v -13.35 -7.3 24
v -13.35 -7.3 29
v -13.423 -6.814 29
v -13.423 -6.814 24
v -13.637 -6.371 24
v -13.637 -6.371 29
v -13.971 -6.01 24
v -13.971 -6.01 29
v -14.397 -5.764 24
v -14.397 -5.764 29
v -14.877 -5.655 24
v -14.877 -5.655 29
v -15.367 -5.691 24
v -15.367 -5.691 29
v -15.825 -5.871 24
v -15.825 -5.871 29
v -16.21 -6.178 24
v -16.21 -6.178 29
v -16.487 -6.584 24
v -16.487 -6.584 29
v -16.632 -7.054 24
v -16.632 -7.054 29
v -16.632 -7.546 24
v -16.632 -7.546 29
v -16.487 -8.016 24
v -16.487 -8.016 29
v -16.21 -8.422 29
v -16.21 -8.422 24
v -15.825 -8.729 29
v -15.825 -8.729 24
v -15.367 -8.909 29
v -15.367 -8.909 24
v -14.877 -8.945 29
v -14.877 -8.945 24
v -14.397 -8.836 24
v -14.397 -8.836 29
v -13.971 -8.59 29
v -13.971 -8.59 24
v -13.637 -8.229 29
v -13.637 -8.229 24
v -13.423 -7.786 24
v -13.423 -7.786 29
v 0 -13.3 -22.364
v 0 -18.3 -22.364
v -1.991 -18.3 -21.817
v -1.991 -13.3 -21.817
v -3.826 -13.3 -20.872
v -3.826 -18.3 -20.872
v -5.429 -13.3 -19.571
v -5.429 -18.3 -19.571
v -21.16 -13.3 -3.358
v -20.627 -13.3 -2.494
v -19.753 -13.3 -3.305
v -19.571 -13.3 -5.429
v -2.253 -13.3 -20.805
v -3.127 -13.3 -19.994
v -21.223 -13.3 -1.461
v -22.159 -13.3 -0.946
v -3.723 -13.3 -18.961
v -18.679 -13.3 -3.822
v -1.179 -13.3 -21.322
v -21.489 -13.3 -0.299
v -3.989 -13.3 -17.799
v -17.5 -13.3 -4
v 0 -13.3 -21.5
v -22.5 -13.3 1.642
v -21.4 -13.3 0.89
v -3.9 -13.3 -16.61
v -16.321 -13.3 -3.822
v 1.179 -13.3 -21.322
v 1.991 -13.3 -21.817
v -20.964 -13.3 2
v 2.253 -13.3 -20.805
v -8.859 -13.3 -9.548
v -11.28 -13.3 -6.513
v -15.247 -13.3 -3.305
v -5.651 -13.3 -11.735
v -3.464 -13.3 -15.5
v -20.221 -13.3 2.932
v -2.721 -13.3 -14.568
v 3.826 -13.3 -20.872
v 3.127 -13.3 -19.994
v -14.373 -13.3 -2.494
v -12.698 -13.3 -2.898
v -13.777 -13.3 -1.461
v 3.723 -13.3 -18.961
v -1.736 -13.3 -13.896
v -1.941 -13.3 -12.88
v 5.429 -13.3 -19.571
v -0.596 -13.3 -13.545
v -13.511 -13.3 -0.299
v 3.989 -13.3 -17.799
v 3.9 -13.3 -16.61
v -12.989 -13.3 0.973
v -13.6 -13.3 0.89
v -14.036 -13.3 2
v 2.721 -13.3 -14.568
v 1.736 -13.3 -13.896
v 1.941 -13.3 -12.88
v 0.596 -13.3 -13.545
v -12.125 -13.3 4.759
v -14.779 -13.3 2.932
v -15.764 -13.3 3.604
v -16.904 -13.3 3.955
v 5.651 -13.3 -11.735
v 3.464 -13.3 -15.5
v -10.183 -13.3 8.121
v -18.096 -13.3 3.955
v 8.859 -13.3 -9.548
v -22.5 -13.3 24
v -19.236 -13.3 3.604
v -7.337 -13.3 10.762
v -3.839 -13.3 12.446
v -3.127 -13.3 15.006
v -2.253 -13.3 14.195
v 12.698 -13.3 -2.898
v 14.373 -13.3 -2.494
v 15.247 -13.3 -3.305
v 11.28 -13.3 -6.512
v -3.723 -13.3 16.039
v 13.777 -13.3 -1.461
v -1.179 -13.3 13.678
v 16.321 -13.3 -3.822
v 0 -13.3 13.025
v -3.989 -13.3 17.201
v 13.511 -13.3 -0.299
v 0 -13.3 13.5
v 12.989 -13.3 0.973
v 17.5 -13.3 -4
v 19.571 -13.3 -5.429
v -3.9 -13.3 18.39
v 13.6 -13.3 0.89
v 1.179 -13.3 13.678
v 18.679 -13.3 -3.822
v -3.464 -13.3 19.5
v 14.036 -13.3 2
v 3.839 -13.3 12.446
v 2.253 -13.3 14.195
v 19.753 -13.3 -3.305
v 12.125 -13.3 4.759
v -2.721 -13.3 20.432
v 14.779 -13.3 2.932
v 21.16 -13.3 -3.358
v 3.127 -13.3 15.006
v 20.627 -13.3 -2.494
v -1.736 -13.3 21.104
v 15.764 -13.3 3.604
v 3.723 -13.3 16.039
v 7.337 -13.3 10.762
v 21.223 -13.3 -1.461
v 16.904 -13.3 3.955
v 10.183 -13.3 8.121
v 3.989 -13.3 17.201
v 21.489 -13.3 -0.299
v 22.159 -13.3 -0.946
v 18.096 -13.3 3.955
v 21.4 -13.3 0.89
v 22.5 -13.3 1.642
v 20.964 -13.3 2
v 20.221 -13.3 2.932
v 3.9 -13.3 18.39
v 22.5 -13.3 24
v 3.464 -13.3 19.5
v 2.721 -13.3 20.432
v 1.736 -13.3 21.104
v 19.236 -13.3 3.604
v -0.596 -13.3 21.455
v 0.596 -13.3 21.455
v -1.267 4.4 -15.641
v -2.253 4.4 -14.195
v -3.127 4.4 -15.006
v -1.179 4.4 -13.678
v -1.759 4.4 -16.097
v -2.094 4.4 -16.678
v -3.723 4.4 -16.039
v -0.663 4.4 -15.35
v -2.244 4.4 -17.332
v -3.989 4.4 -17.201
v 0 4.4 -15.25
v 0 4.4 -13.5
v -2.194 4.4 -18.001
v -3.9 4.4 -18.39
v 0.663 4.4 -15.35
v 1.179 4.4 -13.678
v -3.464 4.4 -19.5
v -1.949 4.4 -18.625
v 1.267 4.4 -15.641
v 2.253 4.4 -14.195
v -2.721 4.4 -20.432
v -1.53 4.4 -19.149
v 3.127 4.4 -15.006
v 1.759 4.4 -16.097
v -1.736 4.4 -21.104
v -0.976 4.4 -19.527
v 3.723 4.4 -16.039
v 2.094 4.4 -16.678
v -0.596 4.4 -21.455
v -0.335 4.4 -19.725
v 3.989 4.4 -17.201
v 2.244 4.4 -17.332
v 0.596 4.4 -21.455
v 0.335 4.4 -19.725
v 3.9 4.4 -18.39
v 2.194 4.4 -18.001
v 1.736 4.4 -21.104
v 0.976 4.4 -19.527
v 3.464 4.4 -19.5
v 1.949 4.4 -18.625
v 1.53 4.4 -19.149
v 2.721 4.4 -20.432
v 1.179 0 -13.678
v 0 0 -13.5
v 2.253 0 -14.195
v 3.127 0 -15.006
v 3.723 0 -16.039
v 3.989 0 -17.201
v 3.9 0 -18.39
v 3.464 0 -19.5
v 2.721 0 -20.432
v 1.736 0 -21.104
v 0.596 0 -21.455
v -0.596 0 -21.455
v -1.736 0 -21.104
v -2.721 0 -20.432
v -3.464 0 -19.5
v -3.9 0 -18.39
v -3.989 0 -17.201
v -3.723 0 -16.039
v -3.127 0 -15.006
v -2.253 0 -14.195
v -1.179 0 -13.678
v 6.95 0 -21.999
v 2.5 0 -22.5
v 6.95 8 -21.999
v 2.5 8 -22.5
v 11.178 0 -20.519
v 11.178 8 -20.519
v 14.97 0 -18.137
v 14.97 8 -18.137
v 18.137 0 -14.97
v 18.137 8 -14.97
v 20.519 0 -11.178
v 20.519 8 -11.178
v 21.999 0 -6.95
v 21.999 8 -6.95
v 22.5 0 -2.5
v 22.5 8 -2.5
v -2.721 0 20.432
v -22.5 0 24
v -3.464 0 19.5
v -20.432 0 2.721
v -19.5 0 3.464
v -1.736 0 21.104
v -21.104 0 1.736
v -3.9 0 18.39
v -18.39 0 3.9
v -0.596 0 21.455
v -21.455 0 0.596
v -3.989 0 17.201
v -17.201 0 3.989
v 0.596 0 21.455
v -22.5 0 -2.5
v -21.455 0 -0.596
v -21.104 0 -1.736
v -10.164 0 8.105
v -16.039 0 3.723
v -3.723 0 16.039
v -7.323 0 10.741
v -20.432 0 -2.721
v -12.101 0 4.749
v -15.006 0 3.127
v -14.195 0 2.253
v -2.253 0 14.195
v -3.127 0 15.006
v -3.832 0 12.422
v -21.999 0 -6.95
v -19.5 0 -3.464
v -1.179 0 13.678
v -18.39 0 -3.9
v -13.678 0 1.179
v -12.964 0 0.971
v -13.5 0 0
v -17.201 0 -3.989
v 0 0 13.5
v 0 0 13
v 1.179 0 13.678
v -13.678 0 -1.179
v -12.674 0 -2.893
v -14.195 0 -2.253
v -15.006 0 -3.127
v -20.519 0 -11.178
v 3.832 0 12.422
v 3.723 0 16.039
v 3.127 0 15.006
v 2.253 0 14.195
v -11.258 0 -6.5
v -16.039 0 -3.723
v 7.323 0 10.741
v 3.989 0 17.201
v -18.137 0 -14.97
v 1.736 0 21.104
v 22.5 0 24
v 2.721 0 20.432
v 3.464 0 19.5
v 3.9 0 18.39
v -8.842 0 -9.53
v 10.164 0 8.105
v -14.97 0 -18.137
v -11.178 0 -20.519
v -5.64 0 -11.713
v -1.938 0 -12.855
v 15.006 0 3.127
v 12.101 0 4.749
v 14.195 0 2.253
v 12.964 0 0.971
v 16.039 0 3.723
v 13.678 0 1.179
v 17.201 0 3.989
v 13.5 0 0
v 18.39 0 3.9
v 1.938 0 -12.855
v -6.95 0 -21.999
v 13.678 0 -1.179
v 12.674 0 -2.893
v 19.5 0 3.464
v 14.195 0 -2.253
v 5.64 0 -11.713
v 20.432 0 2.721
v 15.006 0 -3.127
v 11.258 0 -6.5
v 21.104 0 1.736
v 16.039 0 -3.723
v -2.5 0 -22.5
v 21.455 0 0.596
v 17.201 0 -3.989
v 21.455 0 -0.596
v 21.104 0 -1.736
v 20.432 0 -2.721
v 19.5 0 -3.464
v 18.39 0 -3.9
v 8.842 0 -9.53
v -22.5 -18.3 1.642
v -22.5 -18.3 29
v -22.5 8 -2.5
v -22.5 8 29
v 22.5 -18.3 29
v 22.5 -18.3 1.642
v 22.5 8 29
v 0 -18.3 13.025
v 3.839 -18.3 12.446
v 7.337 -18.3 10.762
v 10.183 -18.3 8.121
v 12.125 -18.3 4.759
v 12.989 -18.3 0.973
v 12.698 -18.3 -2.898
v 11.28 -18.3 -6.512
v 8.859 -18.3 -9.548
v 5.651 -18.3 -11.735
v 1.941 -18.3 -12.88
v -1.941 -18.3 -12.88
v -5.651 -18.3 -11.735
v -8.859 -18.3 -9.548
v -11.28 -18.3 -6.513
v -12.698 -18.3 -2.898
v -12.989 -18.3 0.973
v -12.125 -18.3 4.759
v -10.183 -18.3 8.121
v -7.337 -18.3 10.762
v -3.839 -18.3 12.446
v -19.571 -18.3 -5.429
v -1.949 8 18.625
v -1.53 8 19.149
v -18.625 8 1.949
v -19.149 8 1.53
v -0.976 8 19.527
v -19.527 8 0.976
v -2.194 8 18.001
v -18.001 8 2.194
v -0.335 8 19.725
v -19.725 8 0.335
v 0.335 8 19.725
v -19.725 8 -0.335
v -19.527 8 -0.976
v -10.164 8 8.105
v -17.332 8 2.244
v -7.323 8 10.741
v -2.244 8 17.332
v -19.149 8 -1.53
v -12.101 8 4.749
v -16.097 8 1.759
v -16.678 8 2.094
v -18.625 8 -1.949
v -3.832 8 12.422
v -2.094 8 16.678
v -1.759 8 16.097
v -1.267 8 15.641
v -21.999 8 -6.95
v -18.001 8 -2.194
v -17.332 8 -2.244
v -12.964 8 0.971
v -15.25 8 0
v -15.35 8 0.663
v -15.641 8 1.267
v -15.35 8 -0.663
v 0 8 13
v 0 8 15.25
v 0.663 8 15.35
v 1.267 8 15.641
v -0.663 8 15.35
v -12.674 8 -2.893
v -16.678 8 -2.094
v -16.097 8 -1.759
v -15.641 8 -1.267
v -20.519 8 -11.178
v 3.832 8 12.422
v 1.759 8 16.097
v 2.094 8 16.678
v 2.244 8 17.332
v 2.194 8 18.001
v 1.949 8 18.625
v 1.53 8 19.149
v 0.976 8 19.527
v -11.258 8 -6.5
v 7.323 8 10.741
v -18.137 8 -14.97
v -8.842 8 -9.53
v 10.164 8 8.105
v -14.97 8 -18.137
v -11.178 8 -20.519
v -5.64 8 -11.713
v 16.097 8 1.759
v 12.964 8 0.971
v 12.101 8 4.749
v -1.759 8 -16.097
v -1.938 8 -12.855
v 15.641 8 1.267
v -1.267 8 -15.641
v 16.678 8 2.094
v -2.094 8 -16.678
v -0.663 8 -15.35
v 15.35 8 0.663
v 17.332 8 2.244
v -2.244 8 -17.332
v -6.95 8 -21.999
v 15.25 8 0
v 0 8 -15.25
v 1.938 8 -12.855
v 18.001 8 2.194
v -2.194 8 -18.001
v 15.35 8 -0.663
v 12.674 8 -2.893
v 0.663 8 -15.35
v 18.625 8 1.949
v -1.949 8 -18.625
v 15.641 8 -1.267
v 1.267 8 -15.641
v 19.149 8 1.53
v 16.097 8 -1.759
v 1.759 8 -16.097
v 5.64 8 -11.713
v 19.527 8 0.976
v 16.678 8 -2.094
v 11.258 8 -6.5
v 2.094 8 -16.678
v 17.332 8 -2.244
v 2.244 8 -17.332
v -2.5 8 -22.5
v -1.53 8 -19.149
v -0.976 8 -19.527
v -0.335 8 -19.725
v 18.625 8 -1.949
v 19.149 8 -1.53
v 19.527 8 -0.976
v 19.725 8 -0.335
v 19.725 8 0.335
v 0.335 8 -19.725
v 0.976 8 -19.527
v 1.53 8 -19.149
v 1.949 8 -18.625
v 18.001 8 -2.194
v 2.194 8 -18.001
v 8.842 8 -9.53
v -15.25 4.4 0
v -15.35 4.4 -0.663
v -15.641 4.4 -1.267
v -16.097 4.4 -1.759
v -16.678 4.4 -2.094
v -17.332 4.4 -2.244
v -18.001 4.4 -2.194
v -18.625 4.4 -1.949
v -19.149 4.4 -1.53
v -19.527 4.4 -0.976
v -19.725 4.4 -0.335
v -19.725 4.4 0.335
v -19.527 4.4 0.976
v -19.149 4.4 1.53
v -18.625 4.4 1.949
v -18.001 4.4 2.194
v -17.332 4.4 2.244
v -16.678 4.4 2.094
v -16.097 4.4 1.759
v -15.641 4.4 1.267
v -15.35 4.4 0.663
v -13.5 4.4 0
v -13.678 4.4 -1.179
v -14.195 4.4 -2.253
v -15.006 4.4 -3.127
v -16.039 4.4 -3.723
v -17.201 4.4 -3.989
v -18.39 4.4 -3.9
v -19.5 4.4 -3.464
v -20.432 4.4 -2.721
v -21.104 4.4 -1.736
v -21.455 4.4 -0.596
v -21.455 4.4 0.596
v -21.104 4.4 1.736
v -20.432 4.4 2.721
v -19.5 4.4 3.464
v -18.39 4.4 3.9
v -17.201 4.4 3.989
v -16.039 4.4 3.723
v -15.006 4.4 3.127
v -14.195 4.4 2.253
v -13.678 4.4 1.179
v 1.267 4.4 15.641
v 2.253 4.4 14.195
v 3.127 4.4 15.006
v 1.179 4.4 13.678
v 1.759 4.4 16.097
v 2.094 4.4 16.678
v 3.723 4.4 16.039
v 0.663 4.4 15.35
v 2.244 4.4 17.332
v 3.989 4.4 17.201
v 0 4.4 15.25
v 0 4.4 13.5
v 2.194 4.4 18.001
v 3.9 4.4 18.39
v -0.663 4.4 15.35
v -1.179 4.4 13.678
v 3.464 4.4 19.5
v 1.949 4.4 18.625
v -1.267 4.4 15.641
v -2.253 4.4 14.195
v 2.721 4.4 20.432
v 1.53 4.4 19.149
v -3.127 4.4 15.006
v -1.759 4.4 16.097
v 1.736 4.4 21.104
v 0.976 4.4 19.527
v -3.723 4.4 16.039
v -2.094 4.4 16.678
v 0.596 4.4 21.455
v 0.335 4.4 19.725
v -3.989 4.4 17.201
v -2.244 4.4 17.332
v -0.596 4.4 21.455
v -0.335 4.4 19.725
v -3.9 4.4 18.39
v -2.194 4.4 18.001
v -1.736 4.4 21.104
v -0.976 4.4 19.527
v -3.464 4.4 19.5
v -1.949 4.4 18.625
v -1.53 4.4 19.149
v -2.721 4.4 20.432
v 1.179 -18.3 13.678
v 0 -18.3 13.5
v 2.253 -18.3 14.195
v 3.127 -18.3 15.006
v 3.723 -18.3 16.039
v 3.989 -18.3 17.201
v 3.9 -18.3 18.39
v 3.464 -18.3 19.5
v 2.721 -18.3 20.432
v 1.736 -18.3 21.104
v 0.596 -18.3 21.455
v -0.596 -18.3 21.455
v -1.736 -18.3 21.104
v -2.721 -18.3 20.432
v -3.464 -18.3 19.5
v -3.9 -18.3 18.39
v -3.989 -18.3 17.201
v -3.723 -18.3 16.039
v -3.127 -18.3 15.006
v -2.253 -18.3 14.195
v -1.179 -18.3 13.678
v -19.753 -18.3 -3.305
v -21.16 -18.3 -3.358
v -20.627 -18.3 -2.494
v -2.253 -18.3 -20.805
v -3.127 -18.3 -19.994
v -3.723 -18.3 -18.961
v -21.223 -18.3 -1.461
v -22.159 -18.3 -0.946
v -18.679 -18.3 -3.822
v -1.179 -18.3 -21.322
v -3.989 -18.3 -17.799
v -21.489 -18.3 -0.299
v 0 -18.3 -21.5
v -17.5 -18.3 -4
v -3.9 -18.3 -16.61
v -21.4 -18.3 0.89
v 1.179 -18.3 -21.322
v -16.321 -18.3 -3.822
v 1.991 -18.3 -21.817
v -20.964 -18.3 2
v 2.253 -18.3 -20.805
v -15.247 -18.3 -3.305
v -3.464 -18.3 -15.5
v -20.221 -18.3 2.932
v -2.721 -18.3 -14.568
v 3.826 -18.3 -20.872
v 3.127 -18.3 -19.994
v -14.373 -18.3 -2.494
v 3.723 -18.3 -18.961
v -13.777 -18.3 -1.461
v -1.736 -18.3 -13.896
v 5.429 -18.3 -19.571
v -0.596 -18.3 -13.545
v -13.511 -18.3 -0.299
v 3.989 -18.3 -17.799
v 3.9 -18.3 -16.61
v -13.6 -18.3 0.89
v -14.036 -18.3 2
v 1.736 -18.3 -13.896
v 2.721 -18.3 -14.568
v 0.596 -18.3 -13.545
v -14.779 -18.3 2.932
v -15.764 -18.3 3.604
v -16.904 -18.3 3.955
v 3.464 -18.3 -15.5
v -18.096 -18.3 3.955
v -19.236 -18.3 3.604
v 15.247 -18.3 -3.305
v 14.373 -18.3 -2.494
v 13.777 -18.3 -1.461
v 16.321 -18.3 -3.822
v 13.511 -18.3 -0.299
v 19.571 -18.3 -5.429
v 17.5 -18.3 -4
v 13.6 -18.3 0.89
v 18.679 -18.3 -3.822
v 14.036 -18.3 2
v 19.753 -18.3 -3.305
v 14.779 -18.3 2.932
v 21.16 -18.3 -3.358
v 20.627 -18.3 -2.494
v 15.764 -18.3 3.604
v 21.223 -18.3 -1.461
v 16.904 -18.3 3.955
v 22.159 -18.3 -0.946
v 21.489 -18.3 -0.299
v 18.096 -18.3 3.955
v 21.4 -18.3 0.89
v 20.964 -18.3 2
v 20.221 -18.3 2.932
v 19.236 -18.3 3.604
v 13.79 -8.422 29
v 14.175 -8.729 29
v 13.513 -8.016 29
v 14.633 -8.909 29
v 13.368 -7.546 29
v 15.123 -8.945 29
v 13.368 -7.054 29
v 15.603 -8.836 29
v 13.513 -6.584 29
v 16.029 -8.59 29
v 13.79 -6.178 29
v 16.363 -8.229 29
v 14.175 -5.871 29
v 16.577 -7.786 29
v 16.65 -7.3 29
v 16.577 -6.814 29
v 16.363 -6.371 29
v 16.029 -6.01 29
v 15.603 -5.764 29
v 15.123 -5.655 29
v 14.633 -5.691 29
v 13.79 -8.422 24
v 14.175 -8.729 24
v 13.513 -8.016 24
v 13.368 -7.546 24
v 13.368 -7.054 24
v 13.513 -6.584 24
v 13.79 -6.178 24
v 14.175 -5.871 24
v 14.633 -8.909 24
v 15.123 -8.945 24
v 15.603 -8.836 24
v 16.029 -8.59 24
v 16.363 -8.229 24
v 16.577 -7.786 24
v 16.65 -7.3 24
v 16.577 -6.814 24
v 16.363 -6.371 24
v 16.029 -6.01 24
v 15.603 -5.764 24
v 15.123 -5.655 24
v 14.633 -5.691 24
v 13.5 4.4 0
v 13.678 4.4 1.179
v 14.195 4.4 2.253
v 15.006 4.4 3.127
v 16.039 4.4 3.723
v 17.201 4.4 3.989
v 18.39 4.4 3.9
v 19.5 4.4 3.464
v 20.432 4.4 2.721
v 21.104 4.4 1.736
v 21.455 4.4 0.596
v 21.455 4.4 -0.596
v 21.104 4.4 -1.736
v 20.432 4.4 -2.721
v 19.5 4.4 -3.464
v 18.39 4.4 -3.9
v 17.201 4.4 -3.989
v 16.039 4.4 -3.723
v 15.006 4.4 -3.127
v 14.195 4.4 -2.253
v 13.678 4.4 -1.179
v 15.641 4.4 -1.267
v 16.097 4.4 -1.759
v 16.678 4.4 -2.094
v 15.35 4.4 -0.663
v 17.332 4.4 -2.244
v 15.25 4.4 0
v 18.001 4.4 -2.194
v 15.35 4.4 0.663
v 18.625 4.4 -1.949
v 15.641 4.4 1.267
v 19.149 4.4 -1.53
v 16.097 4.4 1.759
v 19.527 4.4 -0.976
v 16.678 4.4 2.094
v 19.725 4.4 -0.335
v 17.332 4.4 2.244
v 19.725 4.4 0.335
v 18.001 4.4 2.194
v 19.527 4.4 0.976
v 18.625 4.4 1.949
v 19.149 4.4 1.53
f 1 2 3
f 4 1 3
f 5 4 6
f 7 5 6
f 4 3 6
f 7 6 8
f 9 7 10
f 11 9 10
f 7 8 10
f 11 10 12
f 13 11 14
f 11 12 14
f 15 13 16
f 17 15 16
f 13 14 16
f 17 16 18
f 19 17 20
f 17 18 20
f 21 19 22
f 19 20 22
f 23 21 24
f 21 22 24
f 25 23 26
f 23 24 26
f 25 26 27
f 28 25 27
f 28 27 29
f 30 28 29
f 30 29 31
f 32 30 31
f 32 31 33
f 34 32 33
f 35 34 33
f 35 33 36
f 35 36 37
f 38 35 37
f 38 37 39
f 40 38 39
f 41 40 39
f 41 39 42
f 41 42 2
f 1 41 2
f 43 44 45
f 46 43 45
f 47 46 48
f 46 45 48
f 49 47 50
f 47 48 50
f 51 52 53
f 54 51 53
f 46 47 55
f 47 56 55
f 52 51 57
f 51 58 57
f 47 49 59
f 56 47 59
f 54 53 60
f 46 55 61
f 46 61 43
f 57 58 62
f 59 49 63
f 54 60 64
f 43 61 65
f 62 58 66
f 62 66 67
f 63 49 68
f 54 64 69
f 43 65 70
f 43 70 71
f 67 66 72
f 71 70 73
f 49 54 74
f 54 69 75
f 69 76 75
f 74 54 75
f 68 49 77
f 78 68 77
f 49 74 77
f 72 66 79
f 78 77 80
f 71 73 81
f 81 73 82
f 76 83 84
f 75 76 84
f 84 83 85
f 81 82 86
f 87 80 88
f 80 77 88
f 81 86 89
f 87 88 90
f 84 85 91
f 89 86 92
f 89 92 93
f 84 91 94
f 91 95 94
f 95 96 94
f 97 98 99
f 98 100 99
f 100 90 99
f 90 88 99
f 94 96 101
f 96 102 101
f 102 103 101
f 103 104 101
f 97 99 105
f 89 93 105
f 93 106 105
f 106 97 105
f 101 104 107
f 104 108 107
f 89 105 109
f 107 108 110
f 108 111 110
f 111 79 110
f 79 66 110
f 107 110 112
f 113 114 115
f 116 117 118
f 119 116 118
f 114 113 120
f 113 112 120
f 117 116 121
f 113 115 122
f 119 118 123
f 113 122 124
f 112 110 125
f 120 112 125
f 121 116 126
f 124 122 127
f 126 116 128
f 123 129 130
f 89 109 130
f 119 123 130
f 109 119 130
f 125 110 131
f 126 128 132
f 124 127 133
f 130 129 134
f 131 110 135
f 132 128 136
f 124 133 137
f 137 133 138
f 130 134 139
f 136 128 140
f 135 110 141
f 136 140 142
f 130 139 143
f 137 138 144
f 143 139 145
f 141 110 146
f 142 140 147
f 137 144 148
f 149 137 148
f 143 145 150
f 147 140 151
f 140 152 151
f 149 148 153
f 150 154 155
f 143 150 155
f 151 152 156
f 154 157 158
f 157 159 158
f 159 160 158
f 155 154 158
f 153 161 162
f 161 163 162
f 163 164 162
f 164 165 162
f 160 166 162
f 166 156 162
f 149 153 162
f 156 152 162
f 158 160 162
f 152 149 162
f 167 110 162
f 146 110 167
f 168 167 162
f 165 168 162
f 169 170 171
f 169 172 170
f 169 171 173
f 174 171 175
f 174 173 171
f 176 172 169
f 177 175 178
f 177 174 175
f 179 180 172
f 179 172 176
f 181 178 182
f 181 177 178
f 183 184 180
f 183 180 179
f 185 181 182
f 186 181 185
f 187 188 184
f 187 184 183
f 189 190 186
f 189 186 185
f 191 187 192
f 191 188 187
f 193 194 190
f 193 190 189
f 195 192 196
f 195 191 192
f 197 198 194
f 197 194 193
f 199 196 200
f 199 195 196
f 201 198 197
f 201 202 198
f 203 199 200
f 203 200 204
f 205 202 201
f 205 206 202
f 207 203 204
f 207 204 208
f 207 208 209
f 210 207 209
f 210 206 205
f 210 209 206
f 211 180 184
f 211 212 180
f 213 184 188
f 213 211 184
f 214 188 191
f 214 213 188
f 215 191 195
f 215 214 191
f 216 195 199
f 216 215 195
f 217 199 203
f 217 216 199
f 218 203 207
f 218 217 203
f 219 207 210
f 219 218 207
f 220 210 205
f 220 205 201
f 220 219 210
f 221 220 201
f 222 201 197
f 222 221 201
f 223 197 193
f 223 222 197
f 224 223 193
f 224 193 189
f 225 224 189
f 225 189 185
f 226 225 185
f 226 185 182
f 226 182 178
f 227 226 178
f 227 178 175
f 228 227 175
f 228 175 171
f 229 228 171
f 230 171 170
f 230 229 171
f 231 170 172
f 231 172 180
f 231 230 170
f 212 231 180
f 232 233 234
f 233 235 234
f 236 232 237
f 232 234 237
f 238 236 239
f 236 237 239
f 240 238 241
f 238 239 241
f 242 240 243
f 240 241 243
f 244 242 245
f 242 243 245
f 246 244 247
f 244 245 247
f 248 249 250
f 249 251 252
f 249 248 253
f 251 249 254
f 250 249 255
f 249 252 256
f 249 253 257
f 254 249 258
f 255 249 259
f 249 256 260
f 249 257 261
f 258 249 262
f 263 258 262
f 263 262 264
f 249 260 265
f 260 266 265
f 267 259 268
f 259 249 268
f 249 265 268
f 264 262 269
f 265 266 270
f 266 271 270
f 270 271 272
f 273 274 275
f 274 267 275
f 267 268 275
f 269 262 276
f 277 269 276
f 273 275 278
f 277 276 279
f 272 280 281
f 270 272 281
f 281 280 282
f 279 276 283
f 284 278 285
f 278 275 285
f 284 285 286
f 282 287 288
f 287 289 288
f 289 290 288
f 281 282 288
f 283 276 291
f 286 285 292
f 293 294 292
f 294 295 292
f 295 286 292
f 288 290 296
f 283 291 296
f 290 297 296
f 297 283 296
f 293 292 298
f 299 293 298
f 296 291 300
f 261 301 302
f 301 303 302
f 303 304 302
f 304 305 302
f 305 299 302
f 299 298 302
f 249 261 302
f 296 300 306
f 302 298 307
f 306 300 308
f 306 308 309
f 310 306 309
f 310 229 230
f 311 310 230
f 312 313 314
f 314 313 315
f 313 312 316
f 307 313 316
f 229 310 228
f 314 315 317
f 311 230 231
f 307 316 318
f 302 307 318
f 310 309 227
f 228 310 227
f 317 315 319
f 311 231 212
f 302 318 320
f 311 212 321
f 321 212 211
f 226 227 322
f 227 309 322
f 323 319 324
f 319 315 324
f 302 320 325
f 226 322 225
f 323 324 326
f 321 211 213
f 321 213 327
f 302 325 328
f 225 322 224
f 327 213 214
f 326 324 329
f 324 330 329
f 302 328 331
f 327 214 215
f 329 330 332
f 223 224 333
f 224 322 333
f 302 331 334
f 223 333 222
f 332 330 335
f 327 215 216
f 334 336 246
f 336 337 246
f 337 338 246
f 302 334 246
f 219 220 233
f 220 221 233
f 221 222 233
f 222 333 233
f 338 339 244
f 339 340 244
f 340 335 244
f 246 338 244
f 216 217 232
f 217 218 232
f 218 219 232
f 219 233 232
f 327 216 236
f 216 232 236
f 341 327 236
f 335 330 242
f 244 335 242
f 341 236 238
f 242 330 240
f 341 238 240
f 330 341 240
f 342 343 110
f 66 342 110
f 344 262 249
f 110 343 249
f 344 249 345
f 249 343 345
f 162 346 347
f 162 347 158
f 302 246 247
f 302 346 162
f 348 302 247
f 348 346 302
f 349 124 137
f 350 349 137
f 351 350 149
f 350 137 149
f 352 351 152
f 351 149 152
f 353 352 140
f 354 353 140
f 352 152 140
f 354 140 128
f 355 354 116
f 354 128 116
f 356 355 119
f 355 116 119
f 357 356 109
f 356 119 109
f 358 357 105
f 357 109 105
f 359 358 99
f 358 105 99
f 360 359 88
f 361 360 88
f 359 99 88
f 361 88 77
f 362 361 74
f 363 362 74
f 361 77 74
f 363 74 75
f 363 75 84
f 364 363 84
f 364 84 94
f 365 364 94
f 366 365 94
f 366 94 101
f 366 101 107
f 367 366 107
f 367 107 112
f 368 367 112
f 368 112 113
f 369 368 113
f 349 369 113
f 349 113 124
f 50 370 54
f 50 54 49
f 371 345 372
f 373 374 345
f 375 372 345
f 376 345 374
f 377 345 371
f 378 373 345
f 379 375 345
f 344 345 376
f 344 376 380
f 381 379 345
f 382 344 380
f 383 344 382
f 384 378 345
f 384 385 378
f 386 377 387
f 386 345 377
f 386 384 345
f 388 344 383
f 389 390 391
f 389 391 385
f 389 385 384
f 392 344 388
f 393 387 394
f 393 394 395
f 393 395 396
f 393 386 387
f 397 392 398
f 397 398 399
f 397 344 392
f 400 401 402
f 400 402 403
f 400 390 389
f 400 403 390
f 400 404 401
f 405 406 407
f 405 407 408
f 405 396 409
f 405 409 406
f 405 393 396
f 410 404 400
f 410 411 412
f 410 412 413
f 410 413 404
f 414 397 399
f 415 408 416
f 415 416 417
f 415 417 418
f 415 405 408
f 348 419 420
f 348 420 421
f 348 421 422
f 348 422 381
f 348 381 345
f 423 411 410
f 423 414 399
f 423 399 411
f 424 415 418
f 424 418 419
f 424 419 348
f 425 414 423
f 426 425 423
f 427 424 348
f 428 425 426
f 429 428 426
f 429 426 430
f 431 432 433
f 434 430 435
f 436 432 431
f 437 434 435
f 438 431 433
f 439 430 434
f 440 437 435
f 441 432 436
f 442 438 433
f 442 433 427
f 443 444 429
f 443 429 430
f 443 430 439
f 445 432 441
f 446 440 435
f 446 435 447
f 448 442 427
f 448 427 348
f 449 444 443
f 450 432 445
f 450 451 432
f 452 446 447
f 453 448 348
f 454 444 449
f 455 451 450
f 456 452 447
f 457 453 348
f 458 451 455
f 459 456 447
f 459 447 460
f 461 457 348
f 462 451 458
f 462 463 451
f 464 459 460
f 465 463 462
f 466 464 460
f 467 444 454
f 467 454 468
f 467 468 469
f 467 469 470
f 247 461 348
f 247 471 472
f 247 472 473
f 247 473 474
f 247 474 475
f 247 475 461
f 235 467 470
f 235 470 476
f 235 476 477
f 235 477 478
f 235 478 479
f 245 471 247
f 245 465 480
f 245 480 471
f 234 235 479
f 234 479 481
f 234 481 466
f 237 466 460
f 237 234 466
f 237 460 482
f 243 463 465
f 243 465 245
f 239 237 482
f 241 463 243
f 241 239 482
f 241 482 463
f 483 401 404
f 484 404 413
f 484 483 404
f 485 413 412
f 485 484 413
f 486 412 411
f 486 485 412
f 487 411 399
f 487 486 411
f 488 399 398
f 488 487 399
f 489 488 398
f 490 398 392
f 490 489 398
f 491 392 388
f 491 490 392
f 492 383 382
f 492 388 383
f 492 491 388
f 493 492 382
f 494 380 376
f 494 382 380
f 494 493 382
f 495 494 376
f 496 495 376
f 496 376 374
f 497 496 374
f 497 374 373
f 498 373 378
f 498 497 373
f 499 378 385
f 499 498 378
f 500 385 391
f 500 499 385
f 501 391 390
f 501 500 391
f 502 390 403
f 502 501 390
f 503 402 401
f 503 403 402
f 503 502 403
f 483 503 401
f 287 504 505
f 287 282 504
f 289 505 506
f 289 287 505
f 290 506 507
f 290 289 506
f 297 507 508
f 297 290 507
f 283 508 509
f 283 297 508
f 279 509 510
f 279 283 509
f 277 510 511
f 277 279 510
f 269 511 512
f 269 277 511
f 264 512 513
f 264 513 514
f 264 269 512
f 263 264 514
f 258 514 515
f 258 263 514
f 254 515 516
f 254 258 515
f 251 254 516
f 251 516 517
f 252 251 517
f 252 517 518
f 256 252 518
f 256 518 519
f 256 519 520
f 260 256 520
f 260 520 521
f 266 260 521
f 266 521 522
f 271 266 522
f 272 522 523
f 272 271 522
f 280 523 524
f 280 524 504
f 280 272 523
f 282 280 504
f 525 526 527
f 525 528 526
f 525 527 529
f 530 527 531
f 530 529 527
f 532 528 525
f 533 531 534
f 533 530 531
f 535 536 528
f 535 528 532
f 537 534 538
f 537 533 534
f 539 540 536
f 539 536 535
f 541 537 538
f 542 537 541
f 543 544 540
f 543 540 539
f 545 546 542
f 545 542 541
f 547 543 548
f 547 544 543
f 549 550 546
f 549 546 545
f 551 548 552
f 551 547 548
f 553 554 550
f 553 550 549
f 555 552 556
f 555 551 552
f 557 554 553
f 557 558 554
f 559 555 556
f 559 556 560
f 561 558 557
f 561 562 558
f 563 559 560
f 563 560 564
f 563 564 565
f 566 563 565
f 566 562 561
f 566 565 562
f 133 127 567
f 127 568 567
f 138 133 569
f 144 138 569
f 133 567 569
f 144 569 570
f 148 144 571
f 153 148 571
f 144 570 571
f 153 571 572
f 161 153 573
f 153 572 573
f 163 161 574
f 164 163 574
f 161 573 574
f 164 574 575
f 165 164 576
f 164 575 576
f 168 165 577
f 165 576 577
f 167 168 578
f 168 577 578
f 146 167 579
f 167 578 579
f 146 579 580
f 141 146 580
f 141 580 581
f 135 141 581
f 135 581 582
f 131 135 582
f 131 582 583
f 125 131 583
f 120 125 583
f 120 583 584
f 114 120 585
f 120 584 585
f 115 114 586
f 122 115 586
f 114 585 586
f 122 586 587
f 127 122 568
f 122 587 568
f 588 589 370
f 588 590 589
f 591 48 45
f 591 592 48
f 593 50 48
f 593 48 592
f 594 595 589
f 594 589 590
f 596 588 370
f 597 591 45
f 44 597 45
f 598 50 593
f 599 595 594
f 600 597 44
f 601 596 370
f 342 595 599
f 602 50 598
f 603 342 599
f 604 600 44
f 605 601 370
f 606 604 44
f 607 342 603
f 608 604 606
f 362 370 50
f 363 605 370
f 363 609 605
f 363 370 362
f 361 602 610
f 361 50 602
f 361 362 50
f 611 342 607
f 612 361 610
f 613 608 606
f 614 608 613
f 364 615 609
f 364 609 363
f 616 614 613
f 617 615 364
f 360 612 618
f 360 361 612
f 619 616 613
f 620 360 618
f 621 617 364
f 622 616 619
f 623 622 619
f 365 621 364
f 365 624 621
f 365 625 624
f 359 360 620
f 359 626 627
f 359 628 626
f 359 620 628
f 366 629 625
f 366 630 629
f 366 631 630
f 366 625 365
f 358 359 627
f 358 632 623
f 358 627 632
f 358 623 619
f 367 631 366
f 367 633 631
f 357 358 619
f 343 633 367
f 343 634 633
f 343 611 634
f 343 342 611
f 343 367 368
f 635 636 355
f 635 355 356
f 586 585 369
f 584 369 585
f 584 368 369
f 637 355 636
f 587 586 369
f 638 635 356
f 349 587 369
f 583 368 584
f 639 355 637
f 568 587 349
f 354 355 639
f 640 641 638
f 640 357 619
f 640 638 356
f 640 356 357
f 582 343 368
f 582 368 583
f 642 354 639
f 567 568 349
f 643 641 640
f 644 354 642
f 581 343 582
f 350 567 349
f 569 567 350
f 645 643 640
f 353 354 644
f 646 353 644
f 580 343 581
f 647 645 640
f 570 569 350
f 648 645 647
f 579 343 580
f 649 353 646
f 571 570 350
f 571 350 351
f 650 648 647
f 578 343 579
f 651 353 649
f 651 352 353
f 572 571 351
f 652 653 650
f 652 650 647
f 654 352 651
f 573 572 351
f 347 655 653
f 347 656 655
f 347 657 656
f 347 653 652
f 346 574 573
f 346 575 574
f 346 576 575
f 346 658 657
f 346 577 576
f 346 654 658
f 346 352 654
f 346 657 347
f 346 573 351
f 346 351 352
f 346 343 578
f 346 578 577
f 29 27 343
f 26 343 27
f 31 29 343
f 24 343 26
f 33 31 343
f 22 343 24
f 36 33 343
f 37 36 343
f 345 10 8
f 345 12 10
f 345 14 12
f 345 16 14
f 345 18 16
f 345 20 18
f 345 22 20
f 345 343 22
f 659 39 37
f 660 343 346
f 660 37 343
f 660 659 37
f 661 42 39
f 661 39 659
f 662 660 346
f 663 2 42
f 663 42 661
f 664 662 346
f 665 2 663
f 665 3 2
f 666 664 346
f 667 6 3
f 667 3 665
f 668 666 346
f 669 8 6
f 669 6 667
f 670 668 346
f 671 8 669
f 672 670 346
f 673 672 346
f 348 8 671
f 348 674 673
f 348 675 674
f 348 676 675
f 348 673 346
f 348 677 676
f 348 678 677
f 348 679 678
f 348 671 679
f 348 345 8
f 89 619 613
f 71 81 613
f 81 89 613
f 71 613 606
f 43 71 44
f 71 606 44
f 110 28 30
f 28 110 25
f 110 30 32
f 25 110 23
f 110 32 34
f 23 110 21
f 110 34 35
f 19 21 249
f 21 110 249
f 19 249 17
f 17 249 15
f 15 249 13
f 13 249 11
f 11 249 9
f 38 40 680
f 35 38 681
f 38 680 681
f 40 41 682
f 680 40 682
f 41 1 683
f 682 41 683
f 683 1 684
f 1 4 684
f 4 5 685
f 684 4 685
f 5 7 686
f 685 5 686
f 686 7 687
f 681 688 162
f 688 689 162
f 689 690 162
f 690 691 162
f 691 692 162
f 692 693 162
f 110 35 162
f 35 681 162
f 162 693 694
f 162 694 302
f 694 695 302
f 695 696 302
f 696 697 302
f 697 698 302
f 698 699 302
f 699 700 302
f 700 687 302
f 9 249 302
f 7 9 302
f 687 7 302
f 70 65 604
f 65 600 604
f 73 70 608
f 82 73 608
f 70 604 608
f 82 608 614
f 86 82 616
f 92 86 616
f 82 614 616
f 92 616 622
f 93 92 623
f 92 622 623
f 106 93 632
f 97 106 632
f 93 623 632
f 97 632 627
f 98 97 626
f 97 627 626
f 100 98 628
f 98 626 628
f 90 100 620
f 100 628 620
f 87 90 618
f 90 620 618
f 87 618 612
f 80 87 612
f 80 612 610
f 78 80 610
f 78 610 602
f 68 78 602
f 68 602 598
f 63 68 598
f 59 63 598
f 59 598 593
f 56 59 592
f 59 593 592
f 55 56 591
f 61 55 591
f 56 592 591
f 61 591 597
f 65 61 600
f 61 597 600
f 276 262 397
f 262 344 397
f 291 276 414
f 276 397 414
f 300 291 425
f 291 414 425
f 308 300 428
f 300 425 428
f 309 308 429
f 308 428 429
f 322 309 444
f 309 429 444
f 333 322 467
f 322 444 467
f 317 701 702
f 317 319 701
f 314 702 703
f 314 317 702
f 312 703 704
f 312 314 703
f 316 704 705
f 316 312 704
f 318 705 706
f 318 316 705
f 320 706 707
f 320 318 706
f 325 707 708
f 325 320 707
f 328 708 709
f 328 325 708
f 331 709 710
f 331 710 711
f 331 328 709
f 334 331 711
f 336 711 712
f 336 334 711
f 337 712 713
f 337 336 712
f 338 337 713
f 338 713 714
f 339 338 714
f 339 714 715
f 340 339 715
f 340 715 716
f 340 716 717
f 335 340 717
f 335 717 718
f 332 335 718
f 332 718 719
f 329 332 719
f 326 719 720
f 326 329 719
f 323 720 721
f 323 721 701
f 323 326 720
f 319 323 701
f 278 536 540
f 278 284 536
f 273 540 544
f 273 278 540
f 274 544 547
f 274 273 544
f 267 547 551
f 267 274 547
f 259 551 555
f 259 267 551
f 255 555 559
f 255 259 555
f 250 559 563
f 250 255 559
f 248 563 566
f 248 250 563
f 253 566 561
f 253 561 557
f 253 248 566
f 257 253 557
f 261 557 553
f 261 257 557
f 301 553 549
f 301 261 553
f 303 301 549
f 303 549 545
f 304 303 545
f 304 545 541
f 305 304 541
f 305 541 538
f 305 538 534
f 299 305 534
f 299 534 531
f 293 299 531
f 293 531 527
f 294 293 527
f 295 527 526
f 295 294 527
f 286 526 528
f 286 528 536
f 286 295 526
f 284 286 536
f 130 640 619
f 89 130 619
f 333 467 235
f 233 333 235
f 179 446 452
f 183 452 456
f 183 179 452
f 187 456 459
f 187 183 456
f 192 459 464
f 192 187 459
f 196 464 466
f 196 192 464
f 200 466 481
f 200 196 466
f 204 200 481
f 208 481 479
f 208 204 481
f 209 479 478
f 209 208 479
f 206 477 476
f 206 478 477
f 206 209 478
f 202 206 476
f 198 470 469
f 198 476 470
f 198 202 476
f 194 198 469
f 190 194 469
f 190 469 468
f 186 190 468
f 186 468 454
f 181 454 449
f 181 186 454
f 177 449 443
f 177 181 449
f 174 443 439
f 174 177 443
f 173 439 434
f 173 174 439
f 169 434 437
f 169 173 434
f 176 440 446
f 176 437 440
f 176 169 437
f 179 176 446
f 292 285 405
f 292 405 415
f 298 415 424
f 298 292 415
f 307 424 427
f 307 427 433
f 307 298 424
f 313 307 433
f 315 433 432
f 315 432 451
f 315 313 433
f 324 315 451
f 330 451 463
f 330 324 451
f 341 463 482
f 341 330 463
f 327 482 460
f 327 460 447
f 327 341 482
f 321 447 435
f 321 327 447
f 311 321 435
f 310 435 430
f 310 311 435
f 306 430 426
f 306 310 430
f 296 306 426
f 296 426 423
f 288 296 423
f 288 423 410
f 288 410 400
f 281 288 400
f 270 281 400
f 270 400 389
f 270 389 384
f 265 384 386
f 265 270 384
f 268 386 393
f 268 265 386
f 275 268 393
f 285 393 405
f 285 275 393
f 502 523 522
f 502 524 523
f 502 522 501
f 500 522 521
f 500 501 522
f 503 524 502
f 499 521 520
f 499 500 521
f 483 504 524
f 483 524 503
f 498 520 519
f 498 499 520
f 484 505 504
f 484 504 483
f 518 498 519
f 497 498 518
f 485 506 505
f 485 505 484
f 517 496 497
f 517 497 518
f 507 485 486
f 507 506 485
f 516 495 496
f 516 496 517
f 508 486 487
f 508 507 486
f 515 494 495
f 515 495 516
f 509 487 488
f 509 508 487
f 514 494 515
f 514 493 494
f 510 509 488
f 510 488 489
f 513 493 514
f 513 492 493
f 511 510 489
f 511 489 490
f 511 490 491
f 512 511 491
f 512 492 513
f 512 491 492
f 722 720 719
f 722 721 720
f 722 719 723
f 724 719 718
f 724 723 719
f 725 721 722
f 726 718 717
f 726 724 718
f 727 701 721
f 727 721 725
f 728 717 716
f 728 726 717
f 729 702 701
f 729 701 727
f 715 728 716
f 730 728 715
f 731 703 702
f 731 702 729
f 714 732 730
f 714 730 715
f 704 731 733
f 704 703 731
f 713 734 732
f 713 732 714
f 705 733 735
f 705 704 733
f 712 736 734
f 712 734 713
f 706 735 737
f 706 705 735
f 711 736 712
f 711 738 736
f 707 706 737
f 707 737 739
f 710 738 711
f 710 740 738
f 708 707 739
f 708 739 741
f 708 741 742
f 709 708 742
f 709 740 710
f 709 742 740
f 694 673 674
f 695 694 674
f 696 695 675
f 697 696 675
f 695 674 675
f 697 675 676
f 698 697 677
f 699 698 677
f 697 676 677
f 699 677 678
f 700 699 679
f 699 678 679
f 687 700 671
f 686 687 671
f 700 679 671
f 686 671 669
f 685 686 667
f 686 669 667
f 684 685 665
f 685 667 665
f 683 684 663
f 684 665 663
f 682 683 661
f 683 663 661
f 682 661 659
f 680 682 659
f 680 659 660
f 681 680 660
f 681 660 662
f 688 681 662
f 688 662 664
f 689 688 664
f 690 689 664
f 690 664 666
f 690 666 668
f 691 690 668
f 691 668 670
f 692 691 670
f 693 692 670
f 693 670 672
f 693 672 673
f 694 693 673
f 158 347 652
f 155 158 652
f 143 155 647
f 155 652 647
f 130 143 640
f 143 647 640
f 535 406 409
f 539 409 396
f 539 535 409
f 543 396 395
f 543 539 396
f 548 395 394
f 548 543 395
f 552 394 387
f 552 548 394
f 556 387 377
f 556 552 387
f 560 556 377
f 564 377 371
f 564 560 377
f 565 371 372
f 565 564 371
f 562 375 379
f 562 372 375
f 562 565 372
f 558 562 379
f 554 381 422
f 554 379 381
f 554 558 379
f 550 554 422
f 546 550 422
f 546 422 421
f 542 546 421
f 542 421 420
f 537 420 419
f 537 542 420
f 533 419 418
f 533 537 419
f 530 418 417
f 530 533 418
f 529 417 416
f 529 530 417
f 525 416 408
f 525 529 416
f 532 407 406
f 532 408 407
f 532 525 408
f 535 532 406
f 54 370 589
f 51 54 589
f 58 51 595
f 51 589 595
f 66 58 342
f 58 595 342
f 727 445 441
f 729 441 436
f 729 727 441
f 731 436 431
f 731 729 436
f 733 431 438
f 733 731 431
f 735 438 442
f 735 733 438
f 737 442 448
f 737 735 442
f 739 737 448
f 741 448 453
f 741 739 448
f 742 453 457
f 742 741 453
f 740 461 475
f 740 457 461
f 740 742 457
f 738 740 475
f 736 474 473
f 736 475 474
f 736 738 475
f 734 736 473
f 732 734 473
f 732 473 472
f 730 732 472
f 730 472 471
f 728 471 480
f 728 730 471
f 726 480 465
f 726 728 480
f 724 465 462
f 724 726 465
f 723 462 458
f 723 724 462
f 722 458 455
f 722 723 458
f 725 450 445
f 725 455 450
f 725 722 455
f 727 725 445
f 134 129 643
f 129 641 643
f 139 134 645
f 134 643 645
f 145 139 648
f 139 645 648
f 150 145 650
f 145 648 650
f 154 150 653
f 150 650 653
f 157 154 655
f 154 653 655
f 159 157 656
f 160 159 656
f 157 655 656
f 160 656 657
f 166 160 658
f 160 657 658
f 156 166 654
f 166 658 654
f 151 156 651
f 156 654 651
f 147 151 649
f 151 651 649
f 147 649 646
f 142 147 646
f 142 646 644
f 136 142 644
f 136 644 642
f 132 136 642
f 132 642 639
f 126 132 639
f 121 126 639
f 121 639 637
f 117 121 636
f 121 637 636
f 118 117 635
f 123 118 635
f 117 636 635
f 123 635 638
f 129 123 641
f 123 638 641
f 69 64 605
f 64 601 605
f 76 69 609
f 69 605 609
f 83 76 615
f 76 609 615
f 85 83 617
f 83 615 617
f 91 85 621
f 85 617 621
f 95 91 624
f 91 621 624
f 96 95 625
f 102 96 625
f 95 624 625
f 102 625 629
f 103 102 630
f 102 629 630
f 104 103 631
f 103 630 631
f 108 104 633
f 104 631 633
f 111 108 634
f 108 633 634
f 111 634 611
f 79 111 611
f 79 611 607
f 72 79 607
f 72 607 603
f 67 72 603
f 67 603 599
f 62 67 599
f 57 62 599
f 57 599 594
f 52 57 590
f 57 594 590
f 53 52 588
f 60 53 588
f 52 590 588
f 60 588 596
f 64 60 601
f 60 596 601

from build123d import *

# Parameters (mm, degrees)
SKETCH_1_W               = 45
SKETCH_1_H               = 45
SKETCH_1_R               = 13
EXTRUDE_1_DEPTH          = 8
FILLET_1_R               = 20
SKETCH_2_W               = 45
SKETCH_2_H               = 8
EXTRUDE_2_DEPTH          = 6.5
PATTERN_CIRCULAR_1_COUNT = 4
SKETCH_7_W               = 45
SKETCH_7_H               = 5
EXTRUDE_3_DEPTH          = 13.3
SKETCH_9_W               = 45
SKETCH_9_H               = 5
EXTRUDE_4_DEPTH          = 51.5
SKETCH_10_R              = 13.025
CUT_EXTRUDE_1_DEPTH      = 53.3
CUT_EXTRUDE_2_REACH      = 47.155
SKETCH_11_R              = 4
HOLE_WIZARD_M4_1_2_D     = 3.3
HOLE_WIZARD_M4_1_2_DEPTH = 11.5
HOLE_WIZARD_M4_1_2_TIP   = 0.991420021
CUT_EXTRUDE_3_REACH      = 47.155
FILLET_4_R               = 10


with BuildPart() as part:
    # 草图1 → 凸台-拉伸1 (new body)
    with BuildSketch(Plane(origin=(0, 0, 0), x_dir=(1, 0, 0), z_dir=(0, 1, 0))):
        Rectangle(SKETCH_1_W, SKETCH_1_H)
        with Locations(Location((0, 0, 0), (0, 0, 270))):
            Circle(SKETCH_1_R, mode=Mode.SUBTRACT)
    extrude(amount=EXTRUDE_1_DEPTH)

    # 圆角1
    fillet_1_edges = [part.edges().sort_by_distance(p)[0] for p in [
        (-22.5, 4, -22.5),
        (22.5, 4, -22.5),
    ]]
    fillet(fillet_1_edges, radius=FILLET_1_R)

    # 草图2 → 凸台-拉伸2 (add)
    with BuildSketch(Plane.XY.offset(22.5)):
        with Locations((0, 4)):
            Rectangle(SKETCH_2_W, SKETCH_2_H)
    extrude(amount=EXTRUDE_2_DEPTH)

    # 草图6 → Hole Wizard M4 _1 (revolve, cut)
    with BuildSketch(Plane(origin=(0, 0, 17.5), x_dir=(0, 0, -1), z_dir=(1, 0, 0))):
        Polygon((0, 0), (0, 21.351936393), (2.25, 20), (2.25, 4.4), (4, 4.4), (4, 0), align=None)
    hole_wizard_m4_1 = revolve(axis=Axis((0, -6.35, 17.5), (0, 1, 0)), mode=Mode.SUBTRACT)

    # 阵列(圆周)1: Hole Wizard M4 _1 ×4 about axis
    pattern_circular_1_axis = Axis((0, 0, 0), (0, 1, 0))
    for i in range(1, PATTERN_CIRCULAR_1_COUNT):
        add(hole_wizard_m4_1.rotate(pattern_circular_1_axis, i * 360 / PATTERN_CIRCULAR_1_COUNT), mode=Mode.SUBTRACT)

    # 草图7 → 凸台-拉伸3 (add)
    with BuildSketch(Plane.XZ):
        with Locations((0, 26.5)):
            Rectangle(SKETCH_7_W, SKETCH_7_H)
    extrude(amount=EXTRUDE_3_DEPTH)

    # 草图9 → 凸台-拉伸4 (add)
    with BuildSketch(Plane.XY.offset(29)):
        with Locations((0, -15.8)):
            Rectangle(SKETCH_9_W, SKETCH_9_H)
    extrude(amount=-EXTRUDE_4_DEPTH)

    # 草图10 → 切除-拉伸1 (cut)
    with BuildSketch(Plane(origin=(0, -13.3, 0), x_dir=(1, 0, 0), z_dir=(0, 1, 0))):
        with Locations(Location((0, 0, 0), (0, 0, 270))):
            Circle(SKETCH_10_R)
    extrude(amount=-CUT_EXTRUDE_1_DEPTH, mode=Mode.SUBTRACT)

    # 草图11 → 切除-拉伸2 (cut, up to next)
    with BuildSketch(Plane(origin=(0, -18.3, 0), x_dir=(-1, 0, 0), z_dir=(0, -1, 0)), mode=Mode.PRIVATE) as cut_extrude_2_sk1:
        with Locations(Location((0, -17.5, 0), (0, 0, 90))):
            Circle(SKETCH_11_R)
    cut_extrude_2_tool1 = extrude(cut_extrude_2_sk1.sketch, amount=-CUT_EXTRUDE_2_REACH, mode=Mode.PRIVATE) & part.part
    # 草图11 → 切除-拉伸2 (cut, up to next)
    with BuildSketch(Plane(origin=(0, -18.3, 0), x_dir=(-1, 0, 0), z_dir=(0, -1, 0)), mode=Mode.PRIVATE) as cut_extrude_2_sk2:
        with Locations(Location((-17.5, 0, 0), (0, 0, 90))):
            Circle(SKETCH_11_R)
    cut_extrude_2_tool2 = extrude(cut_extrude_2_sk2.sketch, amount=-CUT_EXTRUDE_2_REACH, mode=Mode.PRIVATE) & part.part
    # 草图11 → 切除-拉伸2 (cut, up to next)
    with BuildSketch(Plane(origin=(0, -18.3, 0), x_dir=(-1, 0, 0), z_dir=(0, -1, 0)), mode=Mode.PRIVATE) as cut_extrude_2_sk3:
        with Locations(Location((0, 17.5, 0), (0, 0, 90))):
            Circle(SKETCH_11_R)
    cut_extrude_2_tool3 = extrude(cut_extrude_2_sk3.sketch, amount=-CUT_EXTRUDE_2_REACH, mode=Mode.PRIVATE) & part.part
    # 草图11 → 切除-拉伸2 (cut, up to next)
    with BuildSketch(Plane(origin=(0, -18.3, 0), x_dir=(-1, 0, 0), z_dir=(0, -1, 0)), mode=Mode.PRIVATE) as cut_extrude_2_sk4:
        with Locations(Location((17.5, 0, 0), (0, 0, 90))):
            Circle(SKETCH_11_R)
    cut_extrude_2_tool4 = extrude(cut_extrude_2_sk4.sketch, amount=-CUT_EXTRUDE_2_REACH, mode=Mode.PRIVATE) & part.part
    add(cut_extrude_2_tool1.solids().sort_by_distance((0, -18.3, 17.5))[0], mode=Mode.SUBTRACT)
    add(cut_extrude_2_tool2.solids().sort_by_distance((17.5, -18.3, 0))[0], mode=Mode.SUBTRACT)
    add(cut_extrude_2_tool3.solids().sort_by_distance((0, -18.3, -17.5))[0], mode=Mode.SUBTRACT)
    add(cut_extrude_2_tool4.solids().sort_by_distance((-17.5, -18.3, 0))[0], mode=Mode.SUBTRACT)

    # Hole Wizard M4 _1 2
    with Locations(Plane(origin=(15, -7.3, 24), x_dir=(-1, 0, 0), z_dir=(0, 0, -1))):
        with Locations((0, 0), (30, 0)):
            Hole(HOLE_WIZARD_M4_1_2_D / 2, depth=HOLE_WIZARD_M4_1_2_DEPTH)
            with Locations((0, 0, -(HOLE_WIZARD_M4_1_2_DEPTH + HOLE_WIZARD_M4_1_2_TIP / 2))):  # 118° drill point
                Cone(0, HOLE_WIZARD_M4_1_2_D / 2, HOLE_WIZARD_M4_1_2_TIP, mode=Mode.SUBTRACT)

    # 草图23 → 切除-拉伸3 (cut, up to next)
    with BuildSketch(Plane.XZ.offset(18.3), mode=Mode.PRIVATE) as cut_extrude_3_sk1:
        Polygon((-22.5, -2.5), (-2.5, -22.5), (-22.5, -22.5), align=None)
    cut_extrude_3_tool1 = extrude(cut_extrude_3_sk1.sketch, amount=-CUT_EXTRUDE_3_REACH, mode=Mode.PRIVATE) & part.part
    # 草图23 → 切除-拉伸3 (cut, up to next)
    with BuildSketch(Plane.XZ.offset(18.3), mode=Mode.PRIVATE) as cut_extrude_3_sk2:
        Polygon((22.5, -22.5), (22.5, -2.5), (2.5, -22.5), align=None)
    cut_extrude_3_tool2 = extrude(cut_extrude_3_sk2.sketch, amount=-CUT_EXTRUDE_3_REACH, mode=Mode.PRIVATE) & part.part
    add(cut_extrude_3_tool1.solids().sort_by_distance((-15.833333, -18.3, -15.833333))[0], mode=Mode.SUBTRACT)
    add(cut_extrude_3_tool2.solids().sort_by_distance((15.833333, -18.3, -15.833333))[0], mode=Mode.SUBTRACT)

    # 圆角4
    # the kernel refuses this fillet: 10 mm, written as the material it takes off along each edge
    with BuildSketch(Plane(origin=(-22.5, -28.655339059, -2.5), x_dir=(0, 0, 1), z_dir=(0, 1, 0)), Plane(origin=(-2.5, -28.655339059, -22.5), x_dir=(-0.7071067811865476, 0, 0.7071067811865476), z_dir=(0, 1, 0))) as fillet_4_piece_1:
        with BuildLine():
            CenterArc((FILLET_4_R * 0.414213562373, FILLET_4_R), FILLET_4_R, 225, 45)
            Line((-FILLET_4_R * 0.292893218813, FILLET_4_R * 0.292893218813), (0, 0))
            Line((0, 0), (FILLET_4_R * 0.414213562373, 0))
        make_face()
    extrude(amount=25.710678119, mode=Mode.SUBTRACT)
    with BuildSketch(Plane(origin=(22.5, -28.655339059, -2.5), x_dir=(0, 0, 1), z_dir=(0, 1, 0)), Plane(origin=(2.5, -28.655339059, -22.5), x_dir=(0.7071067811865476, 0, 0.7071067811865476), z_dir=(0, 1, 0))) as fillet_4_piece_2:
        with BuildLine():
            CenterArc((FILLET_4_R * 0.414213562373, -FILLET_4_R), FILLET_4_R, 90, 45)
            Line((-FILLET_4_R * 0.292893218813, -FILLET_4_R * 0.292893218813), (0, 0))
            Line((0, 0), (FILLET_4_R * 0.414213562373, 0))
        make_face()
    extrude(amount=25.710678119, mode=Mode.SUBTRACT)


solid = part.part
